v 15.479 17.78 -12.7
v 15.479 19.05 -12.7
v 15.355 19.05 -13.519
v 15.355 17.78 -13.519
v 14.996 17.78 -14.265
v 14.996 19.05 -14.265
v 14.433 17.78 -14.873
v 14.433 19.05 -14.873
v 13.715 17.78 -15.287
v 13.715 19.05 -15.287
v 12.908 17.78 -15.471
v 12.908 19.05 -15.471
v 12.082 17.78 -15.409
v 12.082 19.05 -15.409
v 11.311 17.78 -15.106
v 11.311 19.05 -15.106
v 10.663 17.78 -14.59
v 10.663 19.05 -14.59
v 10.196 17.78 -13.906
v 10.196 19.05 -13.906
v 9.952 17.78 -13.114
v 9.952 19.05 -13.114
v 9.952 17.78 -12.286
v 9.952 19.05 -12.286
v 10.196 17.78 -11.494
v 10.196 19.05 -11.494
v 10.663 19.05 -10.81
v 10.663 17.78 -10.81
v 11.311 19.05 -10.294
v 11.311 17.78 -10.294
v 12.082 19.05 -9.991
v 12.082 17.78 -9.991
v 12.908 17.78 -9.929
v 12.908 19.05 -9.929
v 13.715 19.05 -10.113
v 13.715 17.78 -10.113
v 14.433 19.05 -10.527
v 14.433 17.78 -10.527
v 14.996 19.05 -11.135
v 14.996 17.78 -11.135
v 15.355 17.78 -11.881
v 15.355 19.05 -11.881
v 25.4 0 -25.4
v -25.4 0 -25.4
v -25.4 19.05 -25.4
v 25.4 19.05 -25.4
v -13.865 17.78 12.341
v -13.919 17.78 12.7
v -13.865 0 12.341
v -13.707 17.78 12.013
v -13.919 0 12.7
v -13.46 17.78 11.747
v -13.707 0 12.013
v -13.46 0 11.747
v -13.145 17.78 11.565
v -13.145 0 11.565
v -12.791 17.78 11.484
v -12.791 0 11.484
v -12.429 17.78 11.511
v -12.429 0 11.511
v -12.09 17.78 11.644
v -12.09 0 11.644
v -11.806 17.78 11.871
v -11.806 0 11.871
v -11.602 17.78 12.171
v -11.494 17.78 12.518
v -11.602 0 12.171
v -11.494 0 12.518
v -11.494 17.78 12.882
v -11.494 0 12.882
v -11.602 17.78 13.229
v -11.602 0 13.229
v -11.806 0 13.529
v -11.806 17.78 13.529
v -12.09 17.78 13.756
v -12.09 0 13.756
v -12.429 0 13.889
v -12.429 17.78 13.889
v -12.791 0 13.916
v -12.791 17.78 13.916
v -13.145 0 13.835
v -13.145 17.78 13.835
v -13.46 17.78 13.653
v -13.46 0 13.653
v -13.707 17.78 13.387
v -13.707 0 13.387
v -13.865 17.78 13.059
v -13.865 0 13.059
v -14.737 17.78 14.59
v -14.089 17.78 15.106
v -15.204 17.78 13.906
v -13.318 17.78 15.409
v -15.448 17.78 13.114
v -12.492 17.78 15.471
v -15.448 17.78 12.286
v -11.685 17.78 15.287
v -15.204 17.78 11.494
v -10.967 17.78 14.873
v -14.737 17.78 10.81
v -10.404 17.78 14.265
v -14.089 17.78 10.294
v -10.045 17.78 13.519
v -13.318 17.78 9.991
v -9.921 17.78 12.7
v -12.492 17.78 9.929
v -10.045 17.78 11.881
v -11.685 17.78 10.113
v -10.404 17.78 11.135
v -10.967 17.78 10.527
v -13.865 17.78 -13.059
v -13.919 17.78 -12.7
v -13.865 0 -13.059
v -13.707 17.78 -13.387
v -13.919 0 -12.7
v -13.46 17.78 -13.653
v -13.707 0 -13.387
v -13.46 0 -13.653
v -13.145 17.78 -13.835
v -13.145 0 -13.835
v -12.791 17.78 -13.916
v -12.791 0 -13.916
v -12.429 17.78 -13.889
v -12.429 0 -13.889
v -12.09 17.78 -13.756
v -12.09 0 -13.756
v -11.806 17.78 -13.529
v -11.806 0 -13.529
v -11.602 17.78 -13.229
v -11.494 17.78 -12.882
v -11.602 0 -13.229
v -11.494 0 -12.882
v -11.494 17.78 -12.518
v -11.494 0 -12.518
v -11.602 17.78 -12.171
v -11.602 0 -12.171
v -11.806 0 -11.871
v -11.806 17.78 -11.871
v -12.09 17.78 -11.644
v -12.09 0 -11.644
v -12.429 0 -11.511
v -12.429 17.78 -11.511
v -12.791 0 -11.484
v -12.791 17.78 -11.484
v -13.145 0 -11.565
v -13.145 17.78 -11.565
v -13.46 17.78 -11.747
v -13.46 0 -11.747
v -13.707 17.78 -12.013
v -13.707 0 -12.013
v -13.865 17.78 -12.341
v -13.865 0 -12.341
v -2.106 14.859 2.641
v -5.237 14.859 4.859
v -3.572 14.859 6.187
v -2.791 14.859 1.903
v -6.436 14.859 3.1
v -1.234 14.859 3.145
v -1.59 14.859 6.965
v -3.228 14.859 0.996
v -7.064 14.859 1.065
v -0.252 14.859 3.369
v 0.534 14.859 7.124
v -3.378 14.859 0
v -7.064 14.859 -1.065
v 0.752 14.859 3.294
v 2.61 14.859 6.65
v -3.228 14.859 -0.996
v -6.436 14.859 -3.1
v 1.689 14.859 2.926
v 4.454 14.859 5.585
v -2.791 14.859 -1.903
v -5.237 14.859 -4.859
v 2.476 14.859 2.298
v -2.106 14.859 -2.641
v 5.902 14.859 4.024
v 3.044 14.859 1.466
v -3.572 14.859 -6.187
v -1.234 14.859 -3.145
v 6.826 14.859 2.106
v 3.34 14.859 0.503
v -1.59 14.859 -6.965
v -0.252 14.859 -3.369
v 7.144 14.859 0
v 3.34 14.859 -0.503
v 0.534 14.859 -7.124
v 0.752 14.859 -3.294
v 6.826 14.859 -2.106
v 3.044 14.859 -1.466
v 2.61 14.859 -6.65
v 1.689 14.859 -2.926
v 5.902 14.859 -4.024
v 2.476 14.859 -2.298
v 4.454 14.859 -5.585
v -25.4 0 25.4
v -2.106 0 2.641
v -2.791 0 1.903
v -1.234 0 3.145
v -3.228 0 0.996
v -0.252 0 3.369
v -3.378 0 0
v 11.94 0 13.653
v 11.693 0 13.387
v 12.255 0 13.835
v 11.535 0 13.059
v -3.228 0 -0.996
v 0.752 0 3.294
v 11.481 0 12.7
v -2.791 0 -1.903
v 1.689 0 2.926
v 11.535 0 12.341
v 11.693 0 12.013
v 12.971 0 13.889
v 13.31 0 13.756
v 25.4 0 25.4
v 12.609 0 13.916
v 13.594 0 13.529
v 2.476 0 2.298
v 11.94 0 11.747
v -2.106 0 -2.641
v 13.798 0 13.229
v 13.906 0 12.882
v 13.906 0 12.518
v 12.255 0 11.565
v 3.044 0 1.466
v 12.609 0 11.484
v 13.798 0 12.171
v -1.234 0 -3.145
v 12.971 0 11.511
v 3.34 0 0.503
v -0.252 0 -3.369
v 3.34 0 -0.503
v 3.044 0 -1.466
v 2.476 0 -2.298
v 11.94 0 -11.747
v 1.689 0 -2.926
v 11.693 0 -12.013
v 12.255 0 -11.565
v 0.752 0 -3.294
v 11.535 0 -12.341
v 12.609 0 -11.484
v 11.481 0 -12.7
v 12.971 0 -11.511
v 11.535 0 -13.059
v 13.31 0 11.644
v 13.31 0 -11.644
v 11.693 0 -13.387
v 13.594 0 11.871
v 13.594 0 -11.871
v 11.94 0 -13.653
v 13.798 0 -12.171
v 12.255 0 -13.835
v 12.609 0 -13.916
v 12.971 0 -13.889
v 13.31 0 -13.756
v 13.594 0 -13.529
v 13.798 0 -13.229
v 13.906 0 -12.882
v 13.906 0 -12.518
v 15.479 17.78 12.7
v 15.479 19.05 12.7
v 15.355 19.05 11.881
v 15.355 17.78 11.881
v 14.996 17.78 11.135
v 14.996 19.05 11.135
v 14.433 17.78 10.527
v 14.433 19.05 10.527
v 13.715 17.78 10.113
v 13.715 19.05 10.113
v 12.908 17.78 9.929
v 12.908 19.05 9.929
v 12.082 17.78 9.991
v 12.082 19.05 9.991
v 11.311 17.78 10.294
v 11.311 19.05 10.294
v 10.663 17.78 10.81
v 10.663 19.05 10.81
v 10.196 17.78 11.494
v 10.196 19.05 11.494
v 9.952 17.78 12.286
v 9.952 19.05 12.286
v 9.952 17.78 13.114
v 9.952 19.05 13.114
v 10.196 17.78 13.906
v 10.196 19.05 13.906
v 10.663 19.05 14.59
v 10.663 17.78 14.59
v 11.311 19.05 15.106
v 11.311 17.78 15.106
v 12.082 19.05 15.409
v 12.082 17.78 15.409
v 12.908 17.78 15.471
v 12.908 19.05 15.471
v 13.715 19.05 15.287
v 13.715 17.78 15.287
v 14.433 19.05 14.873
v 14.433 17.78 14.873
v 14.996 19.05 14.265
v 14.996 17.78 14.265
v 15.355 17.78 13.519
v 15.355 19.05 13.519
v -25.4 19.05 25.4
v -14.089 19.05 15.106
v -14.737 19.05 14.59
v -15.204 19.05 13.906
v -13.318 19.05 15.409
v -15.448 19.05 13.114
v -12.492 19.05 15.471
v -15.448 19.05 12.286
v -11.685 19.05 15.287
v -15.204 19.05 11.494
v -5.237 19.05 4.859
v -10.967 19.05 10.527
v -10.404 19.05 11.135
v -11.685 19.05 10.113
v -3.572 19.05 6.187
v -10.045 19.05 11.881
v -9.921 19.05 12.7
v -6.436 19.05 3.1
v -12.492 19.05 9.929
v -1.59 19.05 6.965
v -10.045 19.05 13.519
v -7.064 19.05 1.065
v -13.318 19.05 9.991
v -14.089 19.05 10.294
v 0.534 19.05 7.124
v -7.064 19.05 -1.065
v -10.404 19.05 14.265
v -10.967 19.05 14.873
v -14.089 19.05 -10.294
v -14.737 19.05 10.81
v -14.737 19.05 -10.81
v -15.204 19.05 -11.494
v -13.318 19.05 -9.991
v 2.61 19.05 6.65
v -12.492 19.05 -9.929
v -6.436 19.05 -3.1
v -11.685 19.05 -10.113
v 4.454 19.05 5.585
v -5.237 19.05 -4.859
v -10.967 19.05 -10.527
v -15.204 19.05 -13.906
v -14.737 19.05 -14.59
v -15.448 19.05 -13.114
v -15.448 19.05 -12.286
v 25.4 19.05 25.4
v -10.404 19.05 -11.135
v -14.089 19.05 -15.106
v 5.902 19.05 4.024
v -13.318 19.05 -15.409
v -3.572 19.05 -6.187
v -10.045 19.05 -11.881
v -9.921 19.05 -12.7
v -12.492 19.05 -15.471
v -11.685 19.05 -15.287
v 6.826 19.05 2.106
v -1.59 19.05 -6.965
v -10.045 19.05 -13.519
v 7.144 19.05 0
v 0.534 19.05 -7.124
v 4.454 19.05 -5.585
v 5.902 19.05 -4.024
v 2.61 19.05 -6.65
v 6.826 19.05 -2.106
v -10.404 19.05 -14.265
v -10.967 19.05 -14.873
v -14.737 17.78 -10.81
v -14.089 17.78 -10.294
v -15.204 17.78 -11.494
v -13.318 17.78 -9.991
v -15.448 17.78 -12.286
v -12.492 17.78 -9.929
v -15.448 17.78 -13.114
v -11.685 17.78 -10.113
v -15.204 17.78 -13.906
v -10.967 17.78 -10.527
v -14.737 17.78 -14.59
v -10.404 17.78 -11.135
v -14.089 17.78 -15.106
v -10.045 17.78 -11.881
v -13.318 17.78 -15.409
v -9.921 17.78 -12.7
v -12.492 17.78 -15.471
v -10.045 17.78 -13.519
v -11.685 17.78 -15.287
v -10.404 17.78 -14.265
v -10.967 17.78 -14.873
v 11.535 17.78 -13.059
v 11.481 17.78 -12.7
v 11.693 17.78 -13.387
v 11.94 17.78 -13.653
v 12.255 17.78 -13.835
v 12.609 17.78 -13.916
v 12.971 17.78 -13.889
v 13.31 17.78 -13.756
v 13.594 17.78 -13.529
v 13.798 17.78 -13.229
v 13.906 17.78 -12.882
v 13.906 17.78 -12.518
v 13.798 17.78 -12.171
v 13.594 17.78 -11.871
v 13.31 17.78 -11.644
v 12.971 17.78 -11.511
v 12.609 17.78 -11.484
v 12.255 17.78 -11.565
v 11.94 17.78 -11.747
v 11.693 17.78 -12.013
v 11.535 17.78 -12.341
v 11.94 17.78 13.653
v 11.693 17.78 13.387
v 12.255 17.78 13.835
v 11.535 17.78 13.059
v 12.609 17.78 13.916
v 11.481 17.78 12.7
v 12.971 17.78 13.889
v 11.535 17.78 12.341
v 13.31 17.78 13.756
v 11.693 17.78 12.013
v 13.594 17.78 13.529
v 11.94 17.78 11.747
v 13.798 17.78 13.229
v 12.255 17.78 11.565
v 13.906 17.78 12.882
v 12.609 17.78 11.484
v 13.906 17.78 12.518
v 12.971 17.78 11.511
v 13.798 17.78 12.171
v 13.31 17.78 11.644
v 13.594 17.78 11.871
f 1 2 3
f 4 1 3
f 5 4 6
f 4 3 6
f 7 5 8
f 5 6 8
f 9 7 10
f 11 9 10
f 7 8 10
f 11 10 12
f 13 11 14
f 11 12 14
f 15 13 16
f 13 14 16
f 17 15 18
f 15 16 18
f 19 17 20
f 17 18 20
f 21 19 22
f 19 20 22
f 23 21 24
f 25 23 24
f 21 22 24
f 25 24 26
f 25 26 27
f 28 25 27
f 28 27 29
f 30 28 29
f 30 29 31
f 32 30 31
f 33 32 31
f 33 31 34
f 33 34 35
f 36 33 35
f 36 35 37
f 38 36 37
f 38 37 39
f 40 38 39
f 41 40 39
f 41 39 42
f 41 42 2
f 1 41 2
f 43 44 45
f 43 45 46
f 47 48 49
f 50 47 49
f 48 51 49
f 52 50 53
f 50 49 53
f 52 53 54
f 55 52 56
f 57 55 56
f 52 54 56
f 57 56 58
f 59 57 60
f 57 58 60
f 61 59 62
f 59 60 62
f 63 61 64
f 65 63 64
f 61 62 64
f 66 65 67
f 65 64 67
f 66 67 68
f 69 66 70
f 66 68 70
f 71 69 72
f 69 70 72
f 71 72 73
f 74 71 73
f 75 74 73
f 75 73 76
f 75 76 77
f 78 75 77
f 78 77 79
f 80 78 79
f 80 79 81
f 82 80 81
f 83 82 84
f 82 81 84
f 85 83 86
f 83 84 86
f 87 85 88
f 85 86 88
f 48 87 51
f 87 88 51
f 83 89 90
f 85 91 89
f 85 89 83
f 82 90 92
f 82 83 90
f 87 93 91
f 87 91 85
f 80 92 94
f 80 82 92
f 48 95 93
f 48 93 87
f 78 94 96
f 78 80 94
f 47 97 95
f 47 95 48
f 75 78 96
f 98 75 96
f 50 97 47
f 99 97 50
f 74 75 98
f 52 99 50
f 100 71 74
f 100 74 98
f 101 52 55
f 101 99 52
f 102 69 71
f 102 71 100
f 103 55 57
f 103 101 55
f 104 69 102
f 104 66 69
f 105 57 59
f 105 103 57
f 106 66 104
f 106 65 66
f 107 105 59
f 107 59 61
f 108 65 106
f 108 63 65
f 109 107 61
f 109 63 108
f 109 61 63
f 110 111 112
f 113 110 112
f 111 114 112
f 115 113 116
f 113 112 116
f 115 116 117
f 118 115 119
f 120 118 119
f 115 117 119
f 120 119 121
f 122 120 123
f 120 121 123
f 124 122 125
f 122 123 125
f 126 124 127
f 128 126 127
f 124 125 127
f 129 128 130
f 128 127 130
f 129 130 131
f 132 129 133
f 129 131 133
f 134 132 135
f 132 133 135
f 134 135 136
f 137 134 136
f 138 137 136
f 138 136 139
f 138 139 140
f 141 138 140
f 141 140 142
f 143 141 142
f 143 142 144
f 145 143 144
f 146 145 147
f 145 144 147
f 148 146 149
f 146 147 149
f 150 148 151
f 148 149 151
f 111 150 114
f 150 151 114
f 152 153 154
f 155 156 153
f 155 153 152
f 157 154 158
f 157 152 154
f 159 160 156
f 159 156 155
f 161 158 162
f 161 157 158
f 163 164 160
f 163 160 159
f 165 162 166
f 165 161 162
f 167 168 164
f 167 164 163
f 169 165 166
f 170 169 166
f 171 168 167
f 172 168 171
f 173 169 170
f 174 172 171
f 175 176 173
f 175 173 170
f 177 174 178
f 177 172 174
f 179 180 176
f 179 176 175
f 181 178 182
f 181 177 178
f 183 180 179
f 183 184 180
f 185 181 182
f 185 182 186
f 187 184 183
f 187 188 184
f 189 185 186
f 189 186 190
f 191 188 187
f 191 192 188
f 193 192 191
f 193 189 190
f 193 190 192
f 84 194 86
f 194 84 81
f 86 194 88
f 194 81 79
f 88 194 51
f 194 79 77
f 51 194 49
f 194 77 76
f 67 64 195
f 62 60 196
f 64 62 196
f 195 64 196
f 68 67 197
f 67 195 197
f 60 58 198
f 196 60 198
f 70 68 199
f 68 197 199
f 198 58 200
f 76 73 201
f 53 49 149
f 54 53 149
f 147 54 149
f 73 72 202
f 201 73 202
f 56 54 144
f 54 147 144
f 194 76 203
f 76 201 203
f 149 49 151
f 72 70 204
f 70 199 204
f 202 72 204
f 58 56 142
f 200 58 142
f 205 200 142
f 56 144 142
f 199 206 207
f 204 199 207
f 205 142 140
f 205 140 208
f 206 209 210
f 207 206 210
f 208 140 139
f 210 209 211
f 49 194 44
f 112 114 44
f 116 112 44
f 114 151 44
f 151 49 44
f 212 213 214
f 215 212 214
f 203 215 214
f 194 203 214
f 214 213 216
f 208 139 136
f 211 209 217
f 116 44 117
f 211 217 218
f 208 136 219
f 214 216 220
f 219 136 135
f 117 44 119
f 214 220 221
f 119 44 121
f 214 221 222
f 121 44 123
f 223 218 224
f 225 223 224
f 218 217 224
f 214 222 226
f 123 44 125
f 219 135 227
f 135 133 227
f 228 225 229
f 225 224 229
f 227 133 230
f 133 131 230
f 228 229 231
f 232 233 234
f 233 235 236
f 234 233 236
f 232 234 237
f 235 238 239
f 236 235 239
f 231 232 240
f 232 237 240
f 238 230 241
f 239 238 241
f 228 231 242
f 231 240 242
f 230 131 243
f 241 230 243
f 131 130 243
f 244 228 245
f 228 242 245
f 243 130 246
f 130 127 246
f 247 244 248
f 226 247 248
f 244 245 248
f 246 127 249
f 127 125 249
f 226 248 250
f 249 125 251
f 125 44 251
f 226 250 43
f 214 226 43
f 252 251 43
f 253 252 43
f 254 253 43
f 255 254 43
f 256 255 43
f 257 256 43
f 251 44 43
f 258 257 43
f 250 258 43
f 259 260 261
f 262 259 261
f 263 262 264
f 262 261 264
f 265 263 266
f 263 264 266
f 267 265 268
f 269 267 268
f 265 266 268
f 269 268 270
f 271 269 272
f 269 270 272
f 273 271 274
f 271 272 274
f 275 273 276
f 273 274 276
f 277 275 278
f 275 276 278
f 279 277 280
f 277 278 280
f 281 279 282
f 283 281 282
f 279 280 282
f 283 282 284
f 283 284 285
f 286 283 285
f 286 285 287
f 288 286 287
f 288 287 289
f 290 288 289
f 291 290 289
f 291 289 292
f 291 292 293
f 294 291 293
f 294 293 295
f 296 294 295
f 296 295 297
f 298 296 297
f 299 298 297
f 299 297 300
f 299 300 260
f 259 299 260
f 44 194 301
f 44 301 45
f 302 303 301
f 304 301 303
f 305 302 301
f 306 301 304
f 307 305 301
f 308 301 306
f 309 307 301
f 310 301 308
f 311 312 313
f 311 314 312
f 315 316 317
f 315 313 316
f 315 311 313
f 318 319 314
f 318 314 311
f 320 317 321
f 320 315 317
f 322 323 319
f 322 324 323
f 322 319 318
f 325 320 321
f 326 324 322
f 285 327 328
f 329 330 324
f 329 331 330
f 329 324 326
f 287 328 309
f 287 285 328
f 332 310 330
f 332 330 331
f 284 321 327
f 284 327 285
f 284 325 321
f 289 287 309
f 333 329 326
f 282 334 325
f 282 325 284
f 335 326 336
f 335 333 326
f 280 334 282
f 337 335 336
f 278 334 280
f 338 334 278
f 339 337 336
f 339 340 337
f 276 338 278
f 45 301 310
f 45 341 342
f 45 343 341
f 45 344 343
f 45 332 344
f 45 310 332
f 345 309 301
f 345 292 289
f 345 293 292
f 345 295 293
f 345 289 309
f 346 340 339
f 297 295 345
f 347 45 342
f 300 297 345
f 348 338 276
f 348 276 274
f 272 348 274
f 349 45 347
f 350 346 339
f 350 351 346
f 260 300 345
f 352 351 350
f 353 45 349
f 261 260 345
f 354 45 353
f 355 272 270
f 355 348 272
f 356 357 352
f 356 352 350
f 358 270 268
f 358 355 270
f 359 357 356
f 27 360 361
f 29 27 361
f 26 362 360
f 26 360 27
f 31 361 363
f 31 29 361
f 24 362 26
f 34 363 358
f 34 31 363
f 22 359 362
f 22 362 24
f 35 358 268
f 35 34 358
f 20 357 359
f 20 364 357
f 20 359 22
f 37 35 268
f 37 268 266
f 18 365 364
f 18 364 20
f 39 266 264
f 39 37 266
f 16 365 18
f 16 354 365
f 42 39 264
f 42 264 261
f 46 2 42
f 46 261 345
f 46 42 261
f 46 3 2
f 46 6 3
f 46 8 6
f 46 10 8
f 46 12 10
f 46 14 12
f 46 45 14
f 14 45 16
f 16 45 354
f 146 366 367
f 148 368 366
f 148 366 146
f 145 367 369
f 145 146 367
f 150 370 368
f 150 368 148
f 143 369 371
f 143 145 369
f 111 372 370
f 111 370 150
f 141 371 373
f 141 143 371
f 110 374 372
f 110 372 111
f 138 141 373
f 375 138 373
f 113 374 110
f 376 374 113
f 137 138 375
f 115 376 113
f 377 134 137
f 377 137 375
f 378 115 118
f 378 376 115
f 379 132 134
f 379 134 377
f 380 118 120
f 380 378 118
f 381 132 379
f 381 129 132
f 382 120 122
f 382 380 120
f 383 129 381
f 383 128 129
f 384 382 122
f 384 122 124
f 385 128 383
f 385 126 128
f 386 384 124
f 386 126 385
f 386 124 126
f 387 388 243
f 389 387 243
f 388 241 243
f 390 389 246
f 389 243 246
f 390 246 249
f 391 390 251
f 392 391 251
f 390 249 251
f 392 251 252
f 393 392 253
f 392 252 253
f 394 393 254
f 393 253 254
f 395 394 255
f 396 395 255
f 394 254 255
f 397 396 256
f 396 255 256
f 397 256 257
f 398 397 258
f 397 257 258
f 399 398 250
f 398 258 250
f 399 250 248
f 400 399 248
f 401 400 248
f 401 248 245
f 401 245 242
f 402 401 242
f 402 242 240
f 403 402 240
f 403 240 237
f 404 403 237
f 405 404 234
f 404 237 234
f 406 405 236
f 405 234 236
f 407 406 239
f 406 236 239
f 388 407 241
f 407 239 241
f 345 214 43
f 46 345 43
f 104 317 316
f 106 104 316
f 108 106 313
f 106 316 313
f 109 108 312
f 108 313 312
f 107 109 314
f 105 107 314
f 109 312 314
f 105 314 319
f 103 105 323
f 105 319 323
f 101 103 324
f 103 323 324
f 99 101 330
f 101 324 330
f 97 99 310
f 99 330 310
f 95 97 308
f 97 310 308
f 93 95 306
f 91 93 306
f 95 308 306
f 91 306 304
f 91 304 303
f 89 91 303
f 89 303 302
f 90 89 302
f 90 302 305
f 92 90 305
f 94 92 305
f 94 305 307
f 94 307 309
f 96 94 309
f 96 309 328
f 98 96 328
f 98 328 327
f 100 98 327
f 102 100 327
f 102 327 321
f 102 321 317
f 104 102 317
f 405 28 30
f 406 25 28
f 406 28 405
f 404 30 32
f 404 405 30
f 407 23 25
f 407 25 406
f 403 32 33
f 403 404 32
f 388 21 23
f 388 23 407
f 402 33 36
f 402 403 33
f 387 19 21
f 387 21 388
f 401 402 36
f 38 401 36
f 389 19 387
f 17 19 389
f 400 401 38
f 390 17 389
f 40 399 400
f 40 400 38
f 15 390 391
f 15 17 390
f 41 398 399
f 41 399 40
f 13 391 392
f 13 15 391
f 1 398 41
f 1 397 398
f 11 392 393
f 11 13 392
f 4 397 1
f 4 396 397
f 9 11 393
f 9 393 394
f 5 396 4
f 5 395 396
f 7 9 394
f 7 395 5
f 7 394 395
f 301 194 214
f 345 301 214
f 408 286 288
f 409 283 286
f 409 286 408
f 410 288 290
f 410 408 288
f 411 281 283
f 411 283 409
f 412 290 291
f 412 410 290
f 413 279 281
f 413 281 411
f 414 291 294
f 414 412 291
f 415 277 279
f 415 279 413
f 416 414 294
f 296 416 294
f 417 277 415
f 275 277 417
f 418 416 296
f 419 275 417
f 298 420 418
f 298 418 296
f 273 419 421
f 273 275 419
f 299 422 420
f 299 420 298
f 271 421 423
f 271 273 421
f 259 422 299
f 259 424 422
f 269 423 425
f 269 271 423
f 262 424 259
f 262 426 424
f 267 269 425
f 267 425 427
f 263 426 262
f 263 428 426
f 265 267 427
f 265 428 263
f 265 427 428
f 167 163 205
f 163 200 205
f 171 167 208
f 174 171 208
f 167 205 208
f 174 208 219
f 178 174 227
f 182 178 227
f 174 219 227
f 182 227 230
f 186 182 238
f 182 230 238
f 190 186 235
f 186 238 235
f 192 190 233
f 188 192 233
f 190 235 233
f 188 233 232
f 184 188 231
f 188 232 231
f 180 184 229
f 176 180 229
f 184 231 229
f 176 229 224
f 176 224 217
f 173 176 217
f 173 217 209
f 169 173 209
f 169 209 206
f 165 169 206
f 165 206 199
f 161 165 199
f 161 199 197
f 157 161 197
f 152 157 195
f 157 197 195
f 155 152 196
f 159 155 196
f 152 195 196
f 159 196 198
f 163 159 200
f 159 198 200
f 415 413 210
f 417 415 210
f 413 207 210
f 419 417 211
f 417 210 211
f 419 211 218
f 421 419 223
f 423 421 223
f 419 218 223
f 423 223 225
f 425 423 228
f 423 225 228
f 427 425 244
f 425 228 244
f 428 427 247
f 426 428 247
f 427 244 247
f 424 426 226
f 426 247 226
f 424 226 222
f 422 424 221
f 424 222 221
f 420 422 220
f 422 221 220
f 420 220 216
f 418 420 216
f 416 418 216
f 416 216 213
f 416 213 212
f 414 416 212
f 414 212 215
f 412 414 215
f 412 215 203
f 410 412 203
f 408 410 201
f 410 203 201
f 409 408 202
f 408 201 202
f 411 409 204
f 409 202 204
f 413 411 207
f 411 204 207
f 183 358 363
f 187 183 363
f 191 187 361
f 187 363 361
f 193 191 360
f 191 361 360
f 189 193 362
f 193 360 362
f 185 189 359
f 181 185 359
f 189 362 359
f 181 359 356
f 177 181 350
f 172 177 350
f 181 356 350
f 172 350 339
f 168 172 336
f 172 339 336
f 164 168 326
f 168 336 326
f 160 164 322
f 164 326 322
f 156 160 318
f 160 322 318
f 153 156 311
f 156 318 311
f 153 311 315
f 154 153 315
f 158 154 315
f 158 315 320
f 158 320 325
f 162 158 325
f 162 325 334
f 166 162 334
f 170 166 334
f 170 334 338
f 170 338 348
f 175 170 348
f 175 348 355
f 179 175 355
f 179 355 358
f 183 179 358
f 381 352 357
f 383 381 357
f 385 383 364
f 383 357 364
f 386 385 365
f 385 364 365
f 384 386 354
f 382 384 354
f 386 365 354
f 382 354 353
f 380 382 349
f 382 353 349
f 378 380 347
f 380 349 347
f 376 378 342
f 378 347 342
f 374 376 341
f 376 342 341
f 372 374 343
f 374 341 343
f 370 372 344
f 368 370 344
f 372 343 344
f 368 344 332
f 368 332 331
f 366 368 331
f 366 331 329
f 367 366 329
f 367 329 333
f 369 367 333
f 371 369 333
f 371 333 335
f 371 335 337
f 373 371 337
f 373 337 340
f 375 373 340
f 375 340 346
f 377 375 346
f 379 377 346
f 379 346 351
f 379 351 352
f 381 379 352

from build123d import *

# Parameters (mm, degrees)
SKETCH1_W                                            = 50.8
SKETCH1_H                                            = 50.8
BOSS_EXTRUDE1_DEPTH                                  = 19.05
CBORE_FOR_1_4_BINDING_HEAD_MACHINE_SCREW_D           = 6.7564
CBORE_FOR_1_4_BINDING_HEAD_MACHINE_SCREW_CBORE_D     = 14.2875
CBORE_FOR_1_4_BINDING_HEAD_MACHINE_SCREW_CBORE_DEPTH = 4.191
CBORE_FOR_2_BINDING_HEAD_MACHINE_SCREW1_D            = 2.4384
CBORE_FOR_2_BINDING_HEAD_MACHINE_SCREW1_CBORE_D      = 5.55752
CBORE_FOR_2_BINDING_HEAD_MACHINE_SCREW1_CBORE_DEPTH  = 1.27
CBORE_FOR_2_BINDING_HEAD_MACHINE_SCREW2_D            = 2.4384
CBORE_FOR_2_BINDING_HEAD_MACHINE_SCREW2_CBORE_D      = 5.55752
CBORE_FOR_2_BINDING_HEAD_MACHINE_SCREW2_CBORE_DEPTH  = 1.27


with BuildPart() as part:
    # Sketch1 → Boss-Extrude1 (new body)
    with BuildSketch(Plane(origin=(0, 0, 0), x_dir=(1, 0, 0), z_dir=(0, 1, 0))):
        Rectangle(SKETCH1_W, SKETCH1_H)
    extrude(amount=BOSS_EXTRUDE1_DEPTH)

    # CBORE for 1/4 Binding Head Machine Screw1 (through all)
    with Locations(Plane(origin=(0, 19.05, 0), x_dir=(1, 0, 0), z_dir=(0, 1, 0))):
        with Locations((0, 0)):
            CounterBoreHole(CBORE_FOR_1_4_BINDING_HEAD_MACHINE_SCREW_D / 2, CBORE_FOR_1_4_BINDING_HEAD_MACHINE_SCREW_CBORE_D / 2, CBORE_FOR_1_4_BINDING_HEAD_MACHINE_SCREW_CBORE_DEPTH)

    # CBORE for #2 Binding Head Machine Screw1 (through all)
    with Locations(Plane(origin=(0, 19.05, 0), x_dir=(1, 0, 0), z_dir=(0, 1, 0))):
        with Locations((-12.7, 12.7), (0, 0)):
            CounterBoreHole(CBORE_FOR_2_BINDING_HEAD_MACHINE_SCREW1_D / 2, CBORE_FOR_2_BINDING_HEAD_MACHINE_SCREW1_CBORE_D / 2, CBORE_FOR_2_BINDING_HEAD_MACHINE_SCREW1_CBORE_DEPTH)

    # CBORE for #2 Binding Head Machine Screw2 (through all)
    with Locations(Plane(origin=(0, 19.05, 0), x_dir=(1, 0, 0), z_dir=(0, 1, 0))):
        with Locations((12.7, 12.7), (-12.7, -12.7), (12.7, -12.7)):
            CounterBoreHole(CBORE_FOR_2_BINDING_HEAD_MACHINE_SCREW2_D / 2, CBORE_FOR_2_BINDING_HEAD_MACHINE_SCREW2_CBORE_D / 2, CBORE_FOR_2_BINDING_HEAD_MACHINE_SCREW2_CBORE_DEPTH)


solid = part.part
